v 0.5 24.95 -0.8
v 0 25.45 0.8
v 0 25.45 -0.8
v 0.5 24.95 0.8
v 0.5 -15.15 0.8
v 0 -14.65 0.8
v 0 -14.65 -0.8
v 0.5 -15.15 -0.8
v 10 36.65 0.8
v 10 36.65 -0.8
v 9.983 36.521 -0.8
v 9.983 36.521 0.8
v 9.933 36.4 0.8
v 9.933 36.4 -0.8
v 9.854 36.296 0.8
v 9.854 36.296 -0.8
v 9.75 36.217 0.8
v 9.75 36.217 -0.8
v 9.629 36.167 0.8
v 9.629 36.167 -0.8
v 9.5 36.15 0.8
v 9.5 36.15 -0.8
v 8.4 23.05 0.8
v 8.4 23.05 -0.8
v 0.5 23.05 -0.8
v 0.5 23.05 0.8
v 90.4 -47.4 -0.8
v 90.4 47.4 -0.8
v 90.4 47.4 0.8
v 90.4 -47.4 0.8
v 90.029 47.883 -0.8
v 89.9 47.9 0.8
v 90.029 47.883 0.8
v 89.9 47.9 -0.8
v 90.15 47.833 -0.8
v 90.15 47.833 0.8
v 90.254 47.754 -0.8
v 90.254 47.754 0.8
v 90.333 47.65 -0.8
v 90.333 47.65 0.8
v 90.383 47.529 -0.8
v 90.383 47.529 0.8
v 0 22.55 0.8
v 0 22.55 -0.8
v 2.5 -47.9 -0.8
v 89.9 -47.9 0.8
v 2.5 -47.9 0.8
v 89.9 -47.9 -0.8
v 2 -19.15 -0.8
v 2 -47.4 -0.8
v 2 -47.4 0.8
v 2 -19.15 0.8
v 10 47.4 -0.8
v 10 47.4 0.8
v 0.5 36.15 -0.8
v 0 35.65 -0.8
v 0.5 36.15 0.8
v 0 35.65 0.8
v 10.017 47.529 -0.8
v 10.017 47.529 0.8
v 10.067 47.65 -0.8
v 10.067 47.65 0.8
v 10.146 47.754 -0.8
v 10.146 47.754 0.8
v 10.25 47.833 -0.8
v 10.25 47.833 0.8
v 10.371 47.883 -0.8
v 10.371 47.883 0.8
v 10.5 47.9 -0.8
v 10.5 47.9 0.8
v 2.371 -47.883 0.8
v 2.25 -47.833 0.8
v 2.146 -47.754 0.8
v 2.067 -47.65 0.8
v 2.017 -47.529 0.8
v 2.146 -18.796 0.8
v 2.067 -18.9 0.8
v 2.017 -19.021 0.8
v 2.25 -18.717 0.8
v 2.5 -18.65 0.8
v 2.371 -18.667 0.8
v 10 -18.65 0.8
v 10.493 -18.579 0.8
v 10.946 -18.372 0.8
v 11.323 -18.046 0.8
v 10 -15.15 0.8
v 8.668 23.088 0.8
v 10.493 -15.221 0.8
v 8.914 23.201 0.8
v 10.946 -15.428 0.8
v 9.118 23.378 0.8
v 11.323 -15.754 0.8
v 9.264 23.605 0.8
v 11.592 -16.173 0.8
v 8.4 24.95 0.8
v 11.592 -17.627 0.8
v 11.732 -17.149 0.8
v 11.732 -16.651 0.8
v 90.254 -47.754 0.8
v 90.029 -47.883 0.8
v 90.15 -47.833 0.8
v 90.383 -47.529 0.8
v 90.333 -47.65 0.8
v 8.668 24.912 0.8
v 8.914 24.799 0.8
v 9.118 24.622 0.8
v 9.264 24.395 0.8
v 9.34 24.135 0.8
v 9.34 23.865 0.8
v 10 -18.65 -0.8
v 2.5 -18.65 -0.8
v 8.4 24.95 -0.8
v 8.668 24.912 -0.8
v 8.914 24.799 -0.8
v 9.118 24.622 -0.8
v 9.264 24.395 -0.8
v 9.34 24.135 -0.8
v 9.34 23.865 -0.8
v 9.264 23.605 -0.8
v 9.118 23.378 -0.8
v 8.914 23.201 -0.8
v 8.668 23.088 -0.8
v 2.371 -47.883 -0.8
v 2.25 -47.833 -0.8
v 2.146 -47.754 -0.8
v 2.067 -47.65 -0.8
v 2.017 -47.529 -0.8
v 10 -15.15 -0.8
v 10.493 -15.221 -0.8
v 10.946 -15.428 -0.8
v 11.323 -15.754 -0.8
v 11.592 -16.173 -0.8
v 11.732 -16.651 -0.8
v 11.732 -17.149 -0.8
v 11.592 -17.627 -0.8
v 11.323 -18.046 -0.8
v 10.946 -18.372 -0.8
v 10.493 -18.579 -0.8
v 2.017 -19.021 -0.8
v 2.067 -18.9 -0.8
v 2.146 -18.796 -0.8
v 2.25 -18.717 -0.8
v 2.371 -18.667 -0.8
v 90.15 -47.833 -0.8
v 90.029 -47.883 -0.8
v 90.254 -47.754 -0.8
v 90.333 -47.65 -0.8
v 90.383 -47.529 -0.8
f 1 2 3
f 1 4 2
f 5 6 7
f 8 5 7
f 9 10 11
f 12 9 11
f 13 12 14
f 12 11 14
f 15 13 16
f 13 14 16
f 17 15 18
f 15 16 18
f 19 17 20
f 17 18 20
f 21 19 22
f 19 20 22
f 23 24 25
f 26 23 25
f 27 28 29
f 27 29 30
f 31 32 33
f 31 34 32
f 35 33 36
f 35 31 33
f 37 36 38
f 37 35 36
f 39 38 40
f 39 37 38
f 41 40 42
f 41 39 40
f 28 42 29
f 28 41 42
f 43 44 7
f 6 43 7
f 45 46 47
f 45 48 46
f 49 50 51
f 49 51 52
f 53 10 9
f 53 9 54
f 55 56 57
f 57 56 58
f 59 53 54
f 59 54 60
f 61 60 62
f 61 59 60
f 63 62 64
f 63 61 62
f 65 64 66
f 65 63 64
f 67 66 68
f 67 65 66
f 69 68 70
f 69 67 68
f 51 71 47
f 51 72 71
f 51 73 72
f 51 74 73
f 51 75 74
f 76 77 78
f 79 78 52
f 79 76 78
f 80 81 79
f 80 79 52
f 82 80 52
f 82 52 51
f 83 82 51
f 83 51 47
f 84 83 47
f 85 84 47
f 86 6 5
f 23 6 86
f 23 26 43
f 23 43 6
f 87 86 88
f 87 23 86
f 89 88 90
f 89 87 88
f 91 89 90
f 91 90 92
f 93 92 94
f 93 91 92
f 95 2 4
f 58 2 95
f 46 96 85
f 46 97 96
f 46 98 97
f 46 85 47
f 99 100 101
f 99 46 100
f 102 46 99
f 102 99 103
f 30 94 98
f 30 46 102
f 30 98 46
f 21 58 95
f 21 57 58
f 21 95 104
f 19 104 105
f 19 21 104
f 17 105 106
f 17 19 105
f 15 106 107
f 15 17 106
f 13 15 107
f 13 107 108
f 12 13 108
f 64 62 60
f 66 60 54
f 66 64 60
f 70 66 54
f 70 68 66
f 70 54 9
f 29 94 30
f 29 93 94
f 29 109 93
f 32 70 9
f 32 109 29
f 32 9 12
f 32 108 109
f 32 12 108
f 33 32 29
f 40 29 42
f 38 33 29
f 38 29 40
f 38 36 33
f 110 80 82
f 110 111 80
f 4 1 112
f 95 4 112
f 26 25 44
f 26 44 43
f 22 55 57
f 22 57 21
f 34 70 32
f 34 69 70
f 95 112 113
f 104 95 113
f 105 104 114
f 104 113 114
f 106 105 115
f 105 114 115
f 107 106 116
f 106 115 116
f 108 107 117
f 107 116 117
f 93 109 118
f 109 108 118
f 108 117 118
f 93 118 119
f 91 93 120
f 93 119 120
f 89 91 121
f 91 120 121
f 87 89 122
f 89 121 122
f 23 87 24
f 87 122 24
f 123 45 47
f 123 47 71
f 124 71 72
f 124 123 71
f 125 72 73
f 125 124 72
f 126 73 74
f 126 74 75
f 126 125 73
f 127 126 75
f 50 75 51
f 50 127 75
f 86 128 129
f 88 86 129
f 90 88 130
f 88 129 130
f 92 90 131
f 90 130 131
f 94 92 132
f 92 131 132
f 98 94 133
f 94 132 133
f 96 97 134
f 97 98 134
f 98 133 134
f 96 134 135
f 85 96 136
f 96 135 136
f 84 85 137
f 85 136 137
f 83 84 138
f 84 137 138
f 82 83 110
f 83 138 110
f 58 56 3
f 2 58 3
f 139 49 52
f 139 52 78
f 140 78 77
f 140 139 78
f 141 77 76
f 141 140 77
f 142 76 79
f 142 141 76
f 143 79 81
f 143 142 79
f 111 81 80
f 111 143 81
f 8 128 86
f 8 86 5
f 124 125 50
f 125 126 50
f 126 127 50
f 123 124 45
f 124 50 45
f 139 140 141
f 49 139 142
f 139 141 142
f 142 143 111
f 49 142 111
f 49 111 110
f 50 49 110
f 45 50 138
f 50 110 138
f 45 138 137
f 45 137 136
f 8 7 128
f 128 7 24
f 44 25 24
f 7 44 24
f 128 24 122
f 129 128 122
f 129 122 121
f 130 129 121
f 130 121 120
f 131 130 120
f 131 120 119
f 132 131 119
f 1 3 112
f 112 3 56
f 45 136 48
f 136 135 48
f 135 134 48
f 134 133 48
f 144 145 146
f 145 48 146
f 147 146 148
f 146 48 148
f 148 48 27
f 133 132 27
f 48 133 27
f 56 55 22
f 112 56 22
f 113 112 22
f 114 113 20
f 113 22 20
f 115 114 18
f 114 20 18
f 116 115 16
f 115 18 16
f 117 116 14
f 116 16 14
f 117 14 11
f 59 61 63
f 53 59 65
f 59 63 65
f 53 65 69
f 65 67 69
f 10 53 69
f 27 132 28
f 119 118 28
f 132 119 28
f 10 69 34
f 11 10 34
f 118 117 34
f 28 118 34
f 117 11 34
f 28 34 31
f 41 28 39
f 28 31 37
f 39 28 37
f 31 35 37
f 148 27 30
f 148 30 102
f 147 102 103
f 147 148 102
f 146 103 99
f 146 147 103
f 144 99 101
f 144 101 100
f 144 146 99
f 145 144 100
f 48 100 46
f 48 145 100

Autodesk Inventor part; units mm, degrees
ref_plane "YZ Plane" through (0, 0, 0) normal (1, 0, 0) x (0, 1, 0)
ref_plane "XZ Plane" through (0, 0, 0) normal (0, 1, 0) x (-1, 0, 0)
ref_plane "XY Plane" through (0, 0, 0) normal (0, 0, 1) x (1, 0, 0)
sketch "Sketch1" plane through (0, 0, 0) normal (0, 0, 1) x (1, 0, 0)
  line L0 (0, 36.15) -> (10, 36.15)
  line L1 (10, 36.15) -> (10, 47.9)
  line L2 (10, 47.9) -> (90.4, 47.9)
  line L3 (90.4, 47.9) -> (90.4, -47.9)
  line L4 (90.4, -47.9) -> (2, -47.9)
  line L5 (10, -15.15) -> (0, -15.15)
  line L6 (-5.5, 48) -> (90.5, 48) construction
  line L7 (90.5, 48) -> (90.5, -48) construction
  line L8 (90.5, -48) -> (-5.5, -48) construction
  line L9 (-5.5, -48) -> (-5.5, 48) construction
  line L10 (-5.4, 47.9) -> (-3.4, 47.9) construction
  line L11 (-3.4, 47.9) -> (-3.4, -47.9) construction
  line L12 (-3.4, -47.9) -> (-5.4, -47.9) construction
  line L13 (-5.4, -47.9) -> (-5.4, 47.9) construction
  line L14 (-3.4, 38.5) -> (7.85, 38.5) construction
  line L15 (7.85, 38.5) -> (7.85, -17.5) construction
  line L16 (7.85, -17.5) -> (-3.4, -17.5) construction
  line L17 (-3.4, -17.5) -> (-3.4, 38.5) construction
  line L18 (2, -47.9) -> (2, -18.65)
  line L19 (2, -18.65) -> (10, -18.65)
  arc A0 (10, -18.65) -> (10, -15.15) centre (10, -16.9) ccw
  line L20 (0, 24) -> (90.5, 24) construction
  circle A1 centre (-2.5, 47.1) radius 0.9 construction
  circle A2 centre (-0.7, 47.1) radius 0.9 construction
  circle A3 centre (1.1, 47.1) radius 0.9 construction
  circle A4 centre (2.9, 47.1) radius 0.9 construction
  circle A5 centre (4.7, 47.1) radius 0.9 construction
  circle A6 centre (6.5, 47.1) radius 0.9 construction
  circle A7 centre (8.3, 47.1) radius 0.9 construction
  circle A8 centre (-2.5, 45.3) radius 0.9 construction
  circle A9 centre (-0.7, 45.3) radius 0.9 construction
  circle A10 centre (1.1, 45.3) radius 0.9 construction
  circle A11 centre (2.9, 45.3) radius 0.9 construction
  circle A12 centre (4.7, 45.3) radius 0.9 construction
  circle A13 centre (6.5, 45.3) radius 0.9 construction
  circle A14 centre (8.3, 45.3) radius 0.9 construction
  circle A15 centre (-2.5, 43.5) radius 0.9 construction
  circle A16 centre (-0.7, 43.5) radius 0.9 construction
  circle A17 centre (1.1, 43.5) radius 0.9 construction
  circle A18 centre (2.9, 43.5) radius 0.9 construction
  circle A19 centre (4.7, 43.5) radius 0.9 construction
  circle A20 centre (6.5, 43.5) radius 0.9 construction
  circle A21 centre (8.3, 43.5) radius 0.9 construction
  circle A22 centre (-2.5, 41.7) radius 0.9 construction
  circle A23 centre (-0.7, 41.7) radius 0.9 construction
  circle A24 centre (1.1, 41.7) radius 0.9 construction
  circle A25 centre (2.9, 41.7) radius 0.9 construction
  circle A26 centre (4.7, 41.7) radius 0.9 construction
  circle A27 centre (6.5, 41.7) radius 0.9 construction
  circle A28 centre (8.3, 41.7) radius 0.9 construction
  circle A29 centre (-2.5, 39.9) radius 0.9 construction
  circle A30 centre (-0.7, 39.9) radius 0.9 construction
  circle A31 centre (1.1, 39.9) radius 0.9 construction
  circle A32 centre (2.9, 39.9) radius 0.9 construction
  circle A33 centre (4.7, 39.9) radius 0.9 construction
  circle A34 centre (6.5, 39.9) radius 0.9 construction
  circle A35 centre (8.3, 39.9) radius 0.9 construction
  line L21 (0, 36.15) -> (0, 24.95)
  line L22 (0, 24.95) -> (8.4, 24.95)
  arc A36 (8.4, 23.05) -> (8.4, 24.95) centre (8.4, 24) ccw
  line L23 (8.4, 23.05) -> (0, 23.05)
  line L24 (0, 23.05) -> (0, -15.15)
  point P0 (0, 0)
  point P1 (-5.5, 0)
  point P2 (90.4, 0)
  point P3 (90.5, 0)
  dimension "d0" = 51.3
  dimension "d1" = 95.8
  dimension "d3" = 10
  dimension "d20" = 96
  dimension "d21" = 96
  dimension "d22" = 0.1
  dimension "d23" = 0.1
  dimension "d24" = 2
  dimension "d25" = 0.1
  dimension "d28" = 11.25
  dimension "d29" = 56
  dimension "d31" = 9.5
  dimension "d32" = 30.5
  dimension "d34" = 3.5
  dimension "d35" = 12.15
  dimension "d36" = 39.15
  dimension "d37" = 14.5
  dimension "d38" = 1.15
  dimension "d39" = 1.8
  dimension "d42" = 1.8
  dimension "d45" = 1.8
  dimension "d48" = 2
  dimension "d49" = 3.4
  dimension "d50" = 1.9
  dimension "d51" = 8.4
  dimension "d52" = 24
extrude "Extrusion1" add sketch "Sketch1" along normal mid plane 1.6
chamfer "Chamfer1" distance 0.5 angle 45 4 edges at (0, 36.15, 0) (0, 24.95, 0) (0, 23.05, 0) (0, -15.15, 0)
fillet "Fillet1" radius 0.5 6 edges at (10, 36.15, 0) (10, 47.9, 0) (90.4, 47.9, 0) (90.4, -47.9, 0) (2, -47.9, 0) (2, -18.65, 0)
equation "\"d23\" = d22"
equation "\"d25\" = d22"
equation "\"d42\" = d39"
equation "\"d45\" = d39"
properties part number "CardStandard" material "Epoxy Resin"
